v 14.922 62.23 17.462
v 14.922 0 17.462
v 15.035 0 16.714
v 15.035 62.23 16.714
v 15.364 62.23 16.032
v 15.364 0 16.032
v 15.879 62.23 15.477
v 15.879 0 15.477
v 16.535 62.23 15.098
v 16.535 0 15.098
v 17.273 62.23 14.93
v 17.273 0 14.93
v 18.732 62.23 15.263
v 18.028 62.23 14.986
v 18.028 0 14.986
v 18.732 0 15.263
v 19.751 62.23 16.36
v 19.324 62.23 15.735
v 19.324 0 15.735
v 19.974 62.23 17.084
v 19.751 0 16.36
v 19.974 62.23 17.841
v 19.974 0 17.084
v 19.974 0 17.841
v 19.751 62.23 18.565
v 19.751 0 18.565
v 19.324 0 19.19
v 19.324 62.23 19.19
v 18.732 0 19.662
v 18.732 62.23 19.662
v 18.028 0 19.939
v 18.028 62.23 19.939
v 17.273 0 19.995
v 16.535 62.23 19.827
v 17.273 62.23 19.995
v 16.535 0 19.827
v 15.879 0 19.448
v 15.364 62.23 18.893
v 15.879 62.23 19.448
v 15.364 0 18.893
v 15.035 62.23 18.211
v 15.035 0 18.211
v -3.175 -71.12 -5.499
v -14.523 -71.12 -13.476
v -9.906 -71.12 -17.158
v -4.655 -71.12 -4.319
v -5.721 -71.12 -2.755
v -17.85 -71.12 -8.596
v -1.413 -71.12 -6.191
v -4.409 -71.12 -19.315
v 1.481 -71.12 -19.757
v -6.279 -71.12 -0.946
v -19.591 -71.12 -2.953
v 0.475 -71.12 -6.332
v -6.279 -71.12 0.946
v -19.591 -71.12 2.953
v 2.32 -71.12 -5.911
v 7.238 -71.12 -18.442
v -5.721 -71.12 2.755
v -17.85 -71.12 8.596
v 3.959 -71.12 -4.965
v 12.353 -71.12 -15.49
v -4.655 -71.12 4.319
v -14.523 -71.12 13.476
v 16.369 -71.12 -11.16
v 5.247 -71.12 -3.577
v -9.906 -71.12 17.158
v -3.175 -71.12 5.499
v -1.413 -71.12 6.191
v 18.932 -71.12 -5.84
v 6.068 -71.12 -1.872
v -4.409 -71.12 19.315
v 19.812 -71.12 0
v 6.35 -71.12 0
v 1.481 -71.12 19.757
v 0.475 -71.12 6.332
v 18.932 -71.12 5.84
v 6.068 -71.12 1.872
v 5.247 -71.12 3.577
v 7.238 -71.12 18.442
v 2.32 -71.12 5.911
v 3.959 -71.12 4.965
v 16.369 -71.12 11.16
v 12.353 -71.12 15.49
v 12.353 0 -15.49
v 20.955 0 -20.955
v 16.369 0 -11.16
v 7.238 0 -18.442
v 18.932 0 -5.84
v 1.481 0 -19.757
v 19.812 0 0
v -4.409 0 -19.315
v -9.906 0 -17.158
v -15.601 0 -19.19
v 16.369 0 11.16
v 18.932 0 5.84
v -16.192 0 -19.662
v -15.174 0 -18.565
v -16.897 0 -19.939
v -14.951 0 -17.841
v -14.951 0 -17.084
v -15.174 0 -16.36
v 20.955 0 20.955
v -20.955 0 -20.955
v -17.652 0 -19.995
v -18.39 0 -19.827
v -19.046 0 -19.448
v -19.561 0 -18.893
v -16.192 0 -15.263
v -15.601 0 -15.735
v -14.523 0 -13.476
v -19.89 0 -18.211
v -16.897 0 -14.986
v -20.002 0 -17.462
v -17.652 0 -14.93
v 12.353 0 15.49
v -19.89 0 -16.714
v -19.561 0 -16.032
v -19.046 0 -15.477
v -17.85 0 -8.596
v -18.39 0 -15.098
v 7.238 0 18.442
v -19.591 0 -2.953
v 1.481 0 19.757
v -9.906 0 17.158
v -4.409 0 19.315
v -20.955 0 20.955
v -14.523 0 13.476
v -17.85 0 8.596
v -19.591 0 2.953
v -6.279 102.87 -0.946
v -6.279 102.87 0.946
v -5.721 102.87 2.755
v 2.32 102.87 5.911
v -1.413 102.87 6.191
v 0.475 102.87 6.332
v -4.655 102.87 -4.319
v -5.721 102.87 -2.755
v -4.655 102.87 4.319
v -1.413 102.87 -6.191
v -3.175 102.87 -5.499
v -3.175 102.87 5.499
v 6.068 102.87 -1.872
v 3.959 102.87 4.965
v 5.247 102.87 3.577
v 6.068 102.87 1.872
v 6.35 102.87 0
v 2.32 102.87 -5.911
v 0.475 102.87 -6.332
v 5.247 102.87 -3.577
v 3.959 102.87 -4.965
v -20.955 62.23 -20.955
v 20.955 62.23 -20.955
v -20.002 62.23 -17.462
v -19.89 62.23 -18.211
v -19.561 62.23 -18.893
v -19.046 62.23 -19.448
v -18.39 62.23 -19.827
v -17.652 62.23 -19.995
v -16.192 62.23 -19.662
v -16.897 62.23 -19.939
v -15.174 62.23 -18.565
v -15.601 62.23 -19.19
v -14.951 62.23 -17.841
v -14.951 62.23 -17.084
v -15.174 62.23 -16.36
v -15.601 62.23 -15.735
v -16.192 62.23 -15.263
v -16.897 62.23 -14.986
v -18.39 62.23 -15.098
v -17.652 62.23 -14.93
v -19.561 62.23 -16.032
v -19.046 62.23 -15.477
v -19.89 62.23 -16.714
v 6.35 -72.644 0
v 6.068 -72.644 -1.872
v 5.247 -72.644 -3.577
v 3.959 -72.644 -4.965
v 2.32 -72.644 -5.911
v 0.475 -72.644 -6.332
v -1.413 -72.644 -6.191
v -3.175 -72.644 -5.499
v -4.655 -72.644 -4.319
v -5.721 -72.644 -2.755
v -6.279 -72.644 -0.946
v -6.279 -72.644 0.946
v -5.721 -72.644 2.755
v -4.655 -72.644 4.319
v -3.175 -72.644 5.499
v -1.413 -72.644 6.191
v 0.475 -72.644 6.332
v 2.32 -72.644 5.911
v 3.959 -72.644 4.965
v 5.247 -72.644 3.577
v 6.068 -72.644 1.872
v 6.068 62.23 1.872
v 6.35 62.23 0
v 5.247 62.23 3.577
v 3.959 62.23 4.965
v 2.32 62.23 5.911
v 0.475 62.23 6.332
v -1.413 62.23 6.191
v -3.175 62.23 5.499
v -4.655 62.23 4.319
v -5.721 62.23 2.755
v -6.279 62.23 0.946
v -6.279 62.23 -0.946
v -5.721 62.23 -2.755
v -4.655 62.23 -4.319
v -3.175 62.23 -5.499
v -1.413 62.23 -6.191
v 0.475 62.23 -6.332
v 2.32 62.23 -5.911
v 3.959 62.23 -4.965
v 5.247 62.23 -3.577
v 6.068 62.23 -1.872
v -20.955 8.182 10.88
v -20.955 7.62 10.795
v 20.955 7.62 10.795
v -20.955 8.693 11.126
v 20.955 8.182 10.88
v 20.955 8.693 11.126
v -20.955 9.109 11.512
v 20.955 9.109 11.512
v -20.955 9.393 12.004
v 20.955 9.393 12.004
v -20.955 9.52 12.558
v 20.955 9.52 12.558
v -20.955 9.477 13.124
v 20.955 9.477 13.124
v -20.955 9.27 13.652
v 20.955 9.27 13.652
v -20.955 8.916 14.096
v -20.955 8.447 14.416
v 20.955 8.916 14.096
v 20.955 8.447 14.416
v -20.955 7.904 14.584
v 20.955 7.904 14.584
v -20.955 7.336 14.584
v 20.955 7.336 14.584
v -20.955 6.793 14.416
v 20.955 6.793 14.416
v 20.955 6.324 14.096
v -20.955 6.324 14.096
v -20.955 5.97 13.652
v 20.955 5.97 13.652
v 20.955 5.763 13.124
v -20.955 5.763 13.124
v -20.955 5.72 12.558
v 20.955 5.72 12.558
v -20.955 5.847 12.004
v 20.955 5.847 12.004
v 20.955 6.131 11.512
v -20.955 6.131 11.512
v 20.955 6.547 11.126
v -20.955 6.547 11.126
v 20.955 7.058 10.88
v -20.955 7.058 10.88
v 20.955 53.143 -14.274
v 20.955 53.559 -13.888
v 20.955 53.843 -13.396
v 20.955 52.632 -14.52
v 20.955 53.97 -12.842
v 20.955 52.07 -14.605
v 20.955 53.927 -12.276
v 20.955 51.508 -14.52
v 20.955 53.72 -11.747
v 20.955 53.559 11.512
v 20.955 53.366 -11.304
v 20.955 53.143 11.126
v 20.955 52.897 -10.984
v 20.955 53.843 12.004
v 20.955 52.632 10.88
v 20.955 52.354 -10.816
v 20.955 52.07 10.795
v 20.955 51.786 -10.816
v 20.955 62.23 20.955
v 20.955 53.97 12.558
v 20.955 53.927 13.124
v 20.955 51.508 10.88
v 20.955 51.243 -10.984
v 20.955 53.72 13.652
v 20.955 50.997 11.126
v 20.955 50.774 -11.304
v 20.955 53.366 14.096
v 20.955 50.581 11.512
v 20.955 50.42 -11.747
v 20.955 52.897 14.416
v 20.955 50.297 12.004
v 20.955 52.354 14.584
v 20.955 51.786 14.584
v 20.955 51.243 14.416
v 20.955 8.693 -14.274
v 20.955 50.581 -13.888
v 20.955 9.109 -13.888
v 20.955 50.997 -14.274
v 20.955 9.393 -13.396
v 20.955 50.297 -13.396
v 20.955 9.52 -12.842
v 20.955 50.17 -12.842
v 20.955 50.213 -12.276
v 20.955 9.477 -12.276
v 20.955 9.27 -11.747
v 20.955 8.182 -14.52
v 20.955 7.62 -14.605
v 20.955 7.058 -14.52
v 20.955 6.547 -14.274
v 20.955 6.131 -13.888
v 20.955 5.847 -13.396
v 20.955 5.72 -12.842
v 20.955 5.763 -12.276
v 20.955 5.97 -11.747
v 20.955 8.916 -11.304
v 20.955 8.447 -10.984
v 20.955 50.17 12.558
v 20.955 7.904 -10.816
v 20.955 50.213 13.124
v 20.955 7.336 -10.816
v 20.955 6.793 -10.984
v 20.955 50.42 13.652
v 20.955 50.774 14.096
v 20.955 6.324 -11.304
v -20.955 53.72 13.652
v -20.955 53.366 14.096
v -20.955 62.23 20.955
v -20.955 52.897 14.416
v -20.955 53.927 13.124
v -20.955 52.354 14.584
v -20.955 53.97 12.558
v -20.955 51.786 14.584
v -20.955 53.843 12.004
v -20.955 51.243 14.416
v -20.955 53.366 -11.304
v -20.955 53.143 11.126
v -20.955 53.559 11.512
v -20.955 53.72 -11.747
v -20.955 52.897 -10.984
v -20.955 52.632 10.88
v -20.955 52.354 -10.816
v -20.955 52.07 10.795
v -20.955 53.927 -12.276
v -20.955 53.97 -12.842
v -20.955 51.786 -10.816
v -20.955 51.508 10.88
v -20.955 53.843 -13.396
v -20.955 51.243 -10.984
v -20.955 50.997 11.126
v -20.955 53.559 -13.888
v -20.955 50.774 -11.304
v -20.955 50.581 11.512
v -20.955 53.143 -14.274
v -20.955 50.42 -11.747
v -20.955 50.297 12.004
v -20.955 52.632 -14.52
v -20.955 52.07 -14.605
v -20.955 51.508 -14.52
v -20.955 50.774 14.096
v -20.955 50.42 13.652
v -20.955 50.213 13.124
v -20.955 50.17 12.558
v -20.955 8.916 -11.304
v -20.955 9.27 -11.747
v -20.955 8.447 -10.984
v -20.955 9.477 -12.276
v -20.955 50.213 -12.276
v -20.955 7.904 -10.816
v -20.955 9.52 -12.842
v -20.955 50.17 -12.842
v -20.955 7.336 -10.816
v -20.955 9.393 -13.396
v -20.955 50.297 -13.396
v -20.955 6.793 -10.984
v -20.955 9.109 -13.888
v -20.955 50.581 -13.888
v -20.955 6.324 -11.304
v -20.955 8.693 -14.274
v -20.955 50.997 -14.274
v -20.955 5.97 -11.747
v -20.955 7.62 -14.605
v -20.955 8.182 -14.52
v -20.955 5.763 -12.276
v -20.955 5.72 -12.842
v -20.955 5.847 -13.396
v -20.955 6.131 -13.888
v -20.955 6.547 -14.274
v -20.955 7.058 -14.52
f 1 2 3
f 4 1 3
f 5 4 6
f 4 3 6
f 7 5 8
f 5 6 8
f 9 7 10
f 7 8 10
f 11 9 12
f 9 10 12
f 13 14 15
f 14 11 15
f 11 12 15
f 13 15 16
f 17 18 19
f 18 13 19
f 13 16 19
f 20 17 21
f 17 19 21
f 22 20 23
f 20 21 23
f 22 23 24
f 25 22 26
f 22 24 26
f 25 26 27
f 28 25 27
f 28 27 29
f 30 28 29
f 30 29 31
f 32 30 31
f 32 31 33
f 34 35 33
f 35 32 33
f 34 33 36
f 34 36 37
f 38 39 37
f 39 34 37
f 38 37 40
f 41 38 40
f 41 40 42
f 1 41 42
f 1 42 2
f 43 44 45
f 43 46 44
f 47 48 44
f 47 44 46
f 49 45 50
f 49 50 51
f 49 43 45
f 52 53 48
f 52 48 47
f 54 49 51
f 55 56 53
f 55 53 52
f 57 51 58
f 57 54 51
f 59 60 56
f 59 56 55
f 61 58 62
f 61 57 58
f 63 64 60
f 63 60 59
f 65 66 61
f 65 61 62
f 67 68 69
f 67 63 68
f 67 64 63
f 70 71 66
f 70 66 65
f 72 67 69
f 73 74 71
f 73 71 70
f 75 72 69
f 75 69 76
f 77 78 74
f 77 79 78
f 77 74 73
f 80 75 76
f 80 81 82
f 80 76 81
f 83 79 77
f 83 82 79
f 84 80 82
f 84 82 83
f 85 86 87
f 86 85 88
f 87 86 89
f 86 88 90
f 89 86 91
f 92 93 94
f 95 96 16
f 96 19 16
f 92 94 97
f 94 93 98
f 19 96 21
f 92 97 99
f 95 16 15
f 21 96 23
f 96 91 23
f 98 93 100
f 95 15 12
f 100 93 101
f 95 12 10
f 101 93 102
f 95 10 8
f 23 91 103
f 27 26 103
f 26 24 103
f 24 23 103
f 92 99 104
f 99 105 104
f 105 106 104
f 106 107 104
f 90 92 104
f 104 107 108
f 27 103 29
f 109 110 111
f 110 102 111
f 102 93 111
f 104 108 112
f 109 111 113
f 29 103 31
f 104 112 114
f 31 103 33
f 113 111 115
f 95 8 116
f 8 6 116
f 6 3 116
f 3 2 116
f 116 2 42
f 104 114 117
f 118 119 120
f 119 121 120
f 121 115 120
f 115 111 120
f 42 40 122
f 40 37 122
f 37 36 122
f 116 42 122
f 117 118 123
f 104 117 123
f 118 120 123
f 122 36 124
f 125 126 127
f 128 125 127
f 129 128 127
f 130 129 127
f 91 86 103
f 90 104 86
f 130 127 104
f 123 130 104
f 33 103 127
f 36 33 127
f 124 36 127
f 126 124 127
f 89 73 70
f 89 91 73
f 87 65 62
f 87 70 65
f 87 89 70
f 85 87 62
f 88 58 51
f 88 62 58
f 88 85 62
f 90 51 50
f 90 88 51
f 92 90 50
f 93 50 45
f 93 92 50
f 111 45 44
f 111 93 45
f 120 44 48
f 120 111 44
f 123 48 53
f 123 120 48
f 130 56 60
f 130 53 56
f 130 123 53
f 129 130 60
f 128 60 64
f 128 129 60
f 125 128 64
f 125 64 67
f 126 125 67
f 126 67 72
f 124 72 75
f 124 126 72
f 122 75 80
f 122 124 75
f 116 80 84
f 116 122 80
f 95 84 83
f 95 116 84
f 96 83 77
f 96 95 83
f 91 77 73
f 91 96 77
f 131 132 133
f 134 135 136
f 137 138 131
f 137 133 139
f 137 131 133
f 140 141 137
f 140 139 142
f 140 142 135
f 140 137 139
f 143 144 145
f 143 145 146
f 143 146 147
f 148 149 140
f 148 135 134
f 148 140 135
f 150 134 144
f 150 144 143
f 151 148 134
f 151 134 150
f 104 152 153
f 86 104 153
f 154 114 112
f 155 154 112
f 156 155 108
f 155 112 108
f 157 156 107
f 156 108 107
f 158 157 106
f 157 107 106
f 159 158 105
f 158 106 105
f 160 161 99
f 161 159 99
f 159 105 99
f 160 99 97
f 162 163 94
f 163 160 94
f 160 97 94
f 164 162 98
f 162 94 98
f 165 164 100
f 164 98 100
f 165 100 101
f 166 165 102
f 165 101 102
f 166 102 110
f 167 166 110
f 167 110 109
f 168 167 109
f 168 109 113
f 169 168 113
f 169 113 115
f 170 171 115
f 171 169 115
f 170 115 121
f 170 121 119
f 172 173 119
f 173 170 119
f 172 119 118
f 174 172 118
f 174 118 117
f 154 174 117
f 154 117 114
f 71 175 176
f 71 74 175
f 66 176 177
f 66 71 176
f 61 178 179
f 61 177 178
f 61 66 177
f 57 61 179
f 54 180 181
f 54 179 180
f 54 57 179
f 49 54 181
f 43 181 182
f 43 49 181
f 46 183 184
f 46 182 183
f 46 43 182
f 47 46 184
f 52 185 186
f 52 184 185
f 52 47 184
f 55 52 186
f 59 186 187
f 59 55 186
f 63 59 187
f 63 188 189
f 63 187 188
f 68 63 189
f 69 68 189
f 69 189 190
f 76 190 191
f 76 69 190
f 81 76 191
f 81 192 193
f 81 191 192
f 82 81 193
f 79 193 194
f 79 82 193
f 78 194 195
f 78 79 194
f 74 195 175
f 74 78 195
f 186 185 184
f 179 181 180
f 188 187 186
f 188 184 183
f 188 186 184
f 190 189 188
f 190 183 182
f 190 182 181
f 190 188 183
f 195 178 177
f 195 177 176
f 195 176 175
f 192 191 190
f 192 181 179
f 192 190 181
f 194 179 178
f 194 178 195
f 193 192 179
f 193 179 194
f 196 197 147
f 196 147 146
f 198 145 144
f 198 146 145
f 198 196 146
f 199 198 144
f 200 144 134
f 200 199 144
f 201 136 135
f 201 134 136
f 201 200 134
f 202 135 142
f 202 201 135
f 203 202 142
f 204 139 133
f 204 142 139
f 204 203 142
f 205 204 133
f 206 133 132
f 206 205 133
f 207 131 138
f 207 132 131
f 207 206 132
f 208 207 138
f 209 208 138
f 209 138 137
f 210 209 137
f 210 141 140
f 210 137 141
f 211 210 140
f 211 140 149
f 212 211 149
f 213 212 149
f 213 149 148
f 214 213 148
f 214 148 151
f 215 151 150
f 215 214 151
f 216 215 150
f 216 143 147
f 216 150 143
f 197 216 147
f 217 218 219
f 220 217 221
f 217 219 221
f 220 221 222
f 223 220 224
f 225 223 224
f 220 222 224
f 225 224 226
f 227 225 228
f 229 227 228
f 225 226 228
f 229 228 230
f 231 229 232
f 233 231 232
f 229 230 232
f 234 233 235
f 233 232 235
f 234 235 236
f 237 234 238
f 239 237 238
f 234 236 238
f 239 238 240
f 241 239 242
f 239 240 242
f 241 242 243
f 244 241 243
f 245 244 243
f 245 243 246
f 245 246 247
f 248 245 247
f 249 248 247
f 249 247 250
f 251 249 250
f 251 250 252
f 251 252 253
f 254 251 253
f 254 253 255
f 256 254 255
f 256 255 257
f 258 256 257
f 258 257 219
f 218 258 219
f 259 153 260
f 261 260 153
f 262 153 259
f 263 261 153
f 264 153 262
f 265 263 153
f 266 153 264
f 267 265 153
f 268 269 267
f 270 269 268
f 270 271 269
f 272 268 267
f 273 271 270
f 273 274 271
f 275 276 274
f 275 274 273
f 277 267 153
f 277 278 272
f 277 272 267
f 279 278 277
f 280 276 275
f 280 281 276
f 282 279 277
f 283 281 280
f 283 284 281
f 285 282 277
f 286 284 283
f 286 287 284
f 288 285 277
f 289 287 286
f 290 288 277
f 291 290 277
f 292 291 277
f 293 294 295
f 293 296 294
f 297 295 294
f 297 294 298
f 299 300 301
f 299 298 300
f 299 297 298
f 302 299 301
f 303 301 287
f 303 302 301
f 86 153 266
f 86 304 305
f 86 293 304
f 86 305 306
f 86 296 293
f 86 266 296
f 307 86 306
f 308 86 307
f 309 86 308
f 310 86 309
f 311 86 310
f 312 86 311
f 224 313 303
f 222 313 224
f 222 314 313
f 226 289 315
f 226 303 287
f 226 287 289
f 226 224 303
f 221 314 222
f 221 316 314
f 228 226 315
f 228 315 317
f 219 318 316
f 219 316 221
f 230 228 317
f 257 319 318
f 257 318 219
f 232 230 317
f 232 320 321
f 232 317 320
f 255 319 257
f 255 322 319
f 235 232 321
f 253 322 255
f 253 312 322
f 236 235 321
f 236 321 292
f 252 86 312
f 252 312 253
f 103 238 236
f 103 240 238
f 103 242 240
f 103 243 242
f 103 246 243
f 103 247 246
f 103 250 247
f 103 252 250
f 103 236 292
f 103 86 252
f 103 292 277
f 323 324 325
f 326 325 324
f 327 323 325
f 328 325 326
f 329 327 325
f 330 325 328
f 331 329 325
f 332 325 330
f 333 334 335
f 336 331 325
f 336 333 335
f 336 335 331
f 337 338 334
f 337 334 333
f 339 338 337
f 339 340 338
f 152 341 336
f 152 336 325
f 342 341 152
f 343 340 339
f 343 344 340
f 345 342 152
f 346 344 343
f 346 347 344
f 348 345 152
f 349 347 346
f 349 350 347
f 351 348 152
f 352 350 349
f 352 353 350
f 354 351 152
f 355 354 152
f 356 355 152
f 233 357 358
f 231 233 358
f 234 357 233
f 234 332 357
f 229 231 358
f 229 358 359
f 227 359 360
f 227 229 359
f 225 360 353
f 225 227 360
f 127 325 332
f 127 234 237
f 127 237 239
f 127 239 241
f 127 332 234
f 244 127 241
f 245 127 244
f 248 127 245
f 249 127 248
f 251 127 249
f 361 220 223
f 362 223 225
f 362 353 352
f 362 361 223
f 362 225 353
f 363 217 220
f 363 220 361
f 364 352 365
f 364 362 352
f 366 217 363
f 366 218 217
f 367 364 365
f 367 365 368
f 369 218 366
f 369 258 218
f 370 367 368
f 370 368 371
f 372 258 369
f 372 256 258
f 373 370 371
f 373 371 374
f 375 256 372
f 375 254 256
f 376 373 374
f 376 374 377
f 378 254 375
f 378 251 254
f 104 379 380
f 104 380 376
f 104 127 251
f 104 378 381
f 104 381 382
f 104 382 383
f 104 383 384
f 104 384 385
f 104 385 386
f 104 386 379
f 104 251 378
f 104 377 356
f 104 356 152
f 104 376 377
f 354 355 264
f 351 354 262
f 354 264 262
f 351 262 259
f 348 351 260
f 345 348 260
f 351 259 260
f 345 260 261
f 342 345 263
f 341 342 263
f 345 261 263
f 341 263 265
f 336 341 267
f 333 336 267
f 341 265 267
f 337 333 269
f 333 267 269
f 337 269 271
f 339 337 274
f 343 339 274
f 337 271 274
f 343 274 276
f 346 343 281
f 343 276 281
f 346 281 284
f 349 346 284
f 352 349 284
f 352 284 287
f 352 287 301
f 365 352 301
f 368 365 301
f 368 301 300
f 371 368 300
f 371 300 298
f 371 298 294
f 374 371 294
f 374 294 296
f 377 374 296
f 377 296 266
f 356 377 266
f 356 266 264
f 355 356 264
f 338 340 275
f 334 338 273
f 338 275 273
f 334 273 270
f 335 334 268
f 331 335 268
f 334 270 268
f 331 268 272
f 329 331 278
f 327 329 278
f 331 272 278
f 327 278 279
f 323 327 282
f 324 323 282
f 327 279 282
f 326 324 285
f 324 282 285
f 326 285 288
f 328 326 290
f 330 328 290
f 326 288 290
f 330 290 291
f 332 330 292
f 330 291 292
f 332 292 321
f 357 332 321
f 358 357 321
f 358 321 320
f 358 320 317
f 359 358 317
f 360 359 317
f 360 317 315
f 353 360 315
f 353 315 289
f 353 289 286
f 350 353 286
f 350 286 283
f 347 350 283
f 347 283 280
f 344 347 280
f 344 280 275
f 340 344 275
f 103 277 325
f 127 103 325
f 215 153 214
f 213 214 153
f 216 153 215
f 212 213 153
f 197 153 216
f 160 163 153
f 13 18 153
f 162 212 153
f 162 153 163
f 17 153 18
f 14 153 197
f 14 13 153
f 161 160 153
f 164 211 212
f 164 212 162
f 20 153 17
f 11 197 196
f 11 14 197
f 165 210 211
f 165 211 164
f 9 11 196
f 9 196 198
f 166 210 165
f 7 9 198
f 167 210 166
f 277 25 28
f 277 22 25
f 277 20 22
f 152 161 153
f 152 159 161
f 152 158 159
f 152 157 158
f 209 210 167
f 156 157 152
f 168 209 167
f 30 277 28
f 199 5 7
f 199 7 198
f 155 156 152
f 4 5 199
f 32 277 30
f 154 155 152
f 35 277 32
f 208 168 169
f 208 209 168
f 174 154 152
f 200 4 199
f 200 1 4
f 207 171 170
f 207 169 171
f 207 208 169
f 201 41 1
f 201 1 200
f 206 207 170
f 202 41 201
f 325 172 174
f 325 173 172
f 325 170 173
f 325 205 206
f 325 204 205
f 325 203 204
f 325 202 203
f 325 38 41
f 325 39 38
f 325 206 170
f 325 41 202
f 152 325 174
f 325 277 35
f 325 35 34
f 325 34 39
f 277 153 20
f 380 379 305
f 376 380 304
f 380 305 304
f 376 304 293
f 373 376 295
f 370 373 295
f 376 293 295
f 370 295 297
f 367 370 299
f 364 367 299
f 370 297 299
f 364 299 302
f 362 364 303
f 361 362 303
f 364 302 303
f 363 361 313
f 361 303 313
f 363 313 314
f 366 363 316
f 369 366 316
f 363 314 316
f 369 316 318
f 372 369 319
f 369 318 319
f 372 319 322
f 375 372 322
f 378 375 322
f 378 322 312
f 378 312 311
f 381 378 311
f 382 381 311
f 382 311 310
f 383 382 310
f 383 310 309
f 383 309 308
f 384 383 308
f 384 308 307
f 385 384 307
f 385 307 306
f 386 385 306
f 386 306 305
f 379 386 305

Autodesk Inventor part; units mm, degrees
ref_plane "YZ Plane" through (0, 0, 0) normal (1, 0, 0) x (0, 1, 0)
ref_plane "XZ Plane" through (0, 0, 0) normal (0, 1, 0) x (-1, 0, 0)
ref_plane "XY Plane" through (0, 0, 0) normal (0, 0, 1) x (1, 0, 0)
sketch "Sketch1" plane through (0, 0, 0) normal (0, 1, 0) x (-1, 0, 0)
  line L0 (-20.955, 20.955) -> (20.955, 20.955)
  line L1 (20.955, 20.955) -> (20.955, -20.955)
  line L2 (20.955, -20.955) -> (-20.955, -20.955)
  line L3 (-20.955, -20.955) -> (-20.955, 20.955)
  line L4 (-20.955, 20.955) -> (20.955, -20.955) construction
  line L5 (20.955, 20.955) -> (-20.955, -20.955) construction
  circle A0 centre (17.4625, -17.4625) radius 2.54
  circle A1 centre (-17.4625, 17.4625) radius 2.54
  line L6 (17.4625, -17.4625) -> (17.4625, 17.4625) construction
  line L7 (-17.4625, 17.4625) -> (-17.4625, -17.4625) construction
  line L8 (0, 20.955) -> (0, -20.955) construction
  point P0 (0, 0)
  dimension "d0" = 41.91
  dimension "d1" = 34.925
  dimension "d2" = 5.08
extrude "Extrusion1" add sketch "Sketch1" along normal blind 62.23
sketch "Sketch2" plane through (0, 0, 0) normal (0, -1, 0) x (1, 0, 0)
  circle A0 centre (0, 0) radius 19.812
  dimension "d5" = 39.624
extrude "Extrusion2" add sketch "Sketch2" along normal blind 71.12
sketch "Sketch3" plane through (0, -71.12, 0) normal (0, -1, 0) x (1, 0, 0)
  circle A0 centre (0, 0) radius 6.35
  dimension "d8" = 12.7
extrude "Extrusion3" add sketch "Sketch3" along normal blind 1.524
sketch "Sketch4" plane through (0, 62.23, 0) normal (0, 1, 0) x (1, 0, 0)
  circle A0 centre (0, 0) radius 6.35
  dimension "d11" = 12.7
extrude "Extrusion4" add sketch "Sketch4" along normal blind 40.64
sketch "Sketch5" plane through (20.955, 0, 20.955) normal (1, 0, 0) x (0, 0, -1)
  line L0 (8.255, 52.07) -> (33.655, 52.07) construction
  line L1 (33.655, 52.07) -> (33.655, 7.62) construction
  line L2 (33.655, 7.62) -> (8.255, 7.62) construction
  line L3 (8.255, 7.62) -> (8.255, 52.07) construction
  line L4 (20.955, 0) -> (20.955, 7.62) construction
  line L5 (0, 62.23) -> (41.91, 62.23) construction
  circle A0 centre (8.255, 52.07) radius 1.905
  circle A1 centre (33.655, 52.07) radius 1.905
  circle A2 centre (33.655, 7.62) radius 1.905
  circle A3 centre (8.255, 7.62) radius 1.905
  dimension "d14" = 25.4
  dimension "d15" = 44.45
  dimension "d16" = 10.16
  dimension "d17" = 3.81
extrude "Extrusion5" cut sketch "Sketch5" against normal through all
properties part number "micro cim"
